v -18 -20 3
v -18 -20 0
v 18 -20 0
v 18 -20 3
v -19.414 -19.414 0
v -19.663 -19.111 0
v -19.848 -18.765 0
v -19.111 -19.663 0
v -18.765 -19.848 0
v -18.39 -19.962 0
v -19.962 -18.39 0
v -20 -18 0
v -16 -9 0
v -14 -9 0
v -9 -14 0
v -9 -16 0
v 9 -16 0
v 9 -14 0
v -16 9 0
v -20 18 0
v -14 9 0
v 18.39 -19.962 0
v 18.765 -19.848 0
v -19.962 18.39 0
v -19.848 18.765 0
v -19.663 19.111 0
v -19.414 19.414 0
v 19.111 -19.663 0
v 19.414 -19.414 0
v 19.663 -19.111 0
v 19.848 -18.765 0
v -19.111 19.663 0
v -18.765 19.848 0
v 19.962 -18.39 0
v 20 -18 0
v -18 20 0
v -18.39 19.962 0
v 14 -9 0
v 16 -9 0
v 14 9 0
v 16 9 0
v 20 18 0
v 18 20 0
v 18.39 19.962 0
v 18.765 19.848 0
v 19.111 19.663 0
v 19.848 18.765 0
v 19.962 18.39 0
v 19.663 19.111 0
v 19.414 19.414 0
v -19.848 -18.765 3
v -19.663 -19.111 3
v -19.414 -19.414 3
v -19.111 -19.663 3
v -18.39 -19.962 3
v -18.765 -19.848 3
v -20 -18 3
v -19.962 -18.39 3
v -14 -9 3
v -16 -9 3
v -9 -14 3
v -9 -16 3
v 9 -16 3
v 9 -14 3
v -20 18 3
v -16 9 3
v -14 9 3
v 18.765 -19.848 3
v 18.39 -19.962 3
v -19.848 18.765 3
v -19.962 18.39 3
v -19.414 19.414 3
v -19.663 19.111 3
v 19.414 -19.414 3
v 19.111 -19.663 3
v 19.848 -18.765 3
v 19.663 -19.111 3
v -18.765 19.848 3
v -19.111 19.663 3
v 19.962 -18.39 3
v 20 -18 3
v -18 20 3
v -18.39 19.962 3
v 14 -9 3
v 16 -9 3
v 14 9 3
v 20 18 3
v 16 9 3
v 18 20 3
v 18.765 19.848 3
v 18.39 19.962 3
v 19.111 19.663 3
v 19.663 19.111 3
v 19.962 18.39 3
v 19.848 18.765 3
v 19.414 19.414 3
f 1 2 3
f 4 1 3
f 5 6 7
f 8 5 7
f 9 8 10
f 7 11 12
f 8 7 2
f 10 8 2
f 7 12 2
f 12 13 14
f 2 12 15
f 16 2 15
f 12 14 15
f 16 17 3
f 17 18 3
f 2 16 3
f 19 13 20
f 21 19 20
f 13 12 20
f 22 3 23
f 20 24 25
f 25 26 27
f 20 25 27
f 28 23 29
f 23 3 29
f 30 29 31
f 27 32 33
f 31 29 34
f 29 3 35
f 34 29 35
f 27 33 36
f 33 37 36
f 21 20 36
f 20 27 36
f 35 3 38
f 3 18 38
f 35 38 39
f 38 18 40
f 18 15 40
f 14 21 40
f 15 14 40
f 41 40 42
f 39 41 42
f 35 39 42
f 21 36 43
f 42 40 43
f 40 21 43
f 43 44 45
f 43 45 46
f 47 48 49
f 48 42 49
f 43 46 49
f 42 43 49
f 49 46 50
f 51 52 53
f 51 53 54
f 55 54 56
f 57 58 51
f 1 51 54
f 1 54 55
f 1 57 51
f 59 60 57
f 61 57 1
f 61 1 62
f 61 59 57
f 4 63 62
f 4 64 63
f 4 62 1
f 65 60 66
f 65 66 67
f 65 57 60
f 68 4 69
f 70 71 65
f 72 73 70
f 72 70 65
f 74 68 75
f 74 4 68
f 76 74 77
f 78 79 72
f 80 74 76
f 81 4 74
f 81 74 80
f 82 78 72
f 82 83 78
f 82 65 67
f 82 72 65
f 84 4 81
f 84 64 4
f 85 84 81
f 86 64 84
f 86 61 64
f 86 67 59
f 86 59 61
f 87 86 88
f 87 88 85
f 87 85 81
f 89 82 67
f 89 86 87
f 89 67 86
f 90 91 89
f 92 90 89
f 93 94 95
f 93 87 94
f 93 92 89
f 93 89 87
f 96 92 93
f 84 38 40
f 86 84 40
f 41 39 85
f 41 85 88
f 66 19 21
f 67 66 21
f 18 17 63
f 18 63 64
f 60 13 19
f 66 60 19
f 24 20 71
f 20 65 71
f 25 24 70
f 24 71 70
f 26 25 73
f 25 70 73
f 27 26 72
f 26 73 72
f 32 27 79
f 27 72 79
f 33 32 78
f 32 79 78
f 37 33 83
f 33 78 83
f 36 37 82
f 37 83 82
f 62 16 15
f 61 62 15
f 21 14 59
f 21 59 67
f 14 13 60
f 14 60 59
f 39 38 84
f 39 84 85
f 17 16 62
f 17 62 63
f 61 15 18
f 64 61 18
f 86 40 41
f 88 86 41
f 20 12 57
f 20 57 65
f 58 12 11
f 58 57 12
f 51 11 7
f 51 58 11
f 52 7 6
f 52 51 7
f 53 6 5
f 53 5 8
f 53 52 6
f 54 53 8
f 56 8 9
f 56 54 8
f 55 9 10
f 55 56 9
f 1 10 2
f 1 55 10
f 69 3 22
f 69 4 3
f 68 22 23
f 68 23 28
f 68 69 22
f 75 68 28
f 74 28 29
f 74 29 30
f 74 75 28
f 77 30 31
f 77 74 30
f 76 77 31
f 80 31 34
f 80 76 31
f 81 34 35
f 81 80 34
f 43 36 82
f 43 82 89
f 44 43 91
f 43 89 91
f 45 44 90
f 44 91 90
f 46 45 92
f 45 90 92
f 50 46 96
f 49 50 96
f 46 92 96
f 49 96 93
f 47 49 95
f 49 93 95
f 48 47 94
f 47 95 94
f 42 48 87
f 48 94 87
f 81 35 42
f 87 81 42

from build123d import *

# Parameters (mm, degrees)
F0_W     = 40
F0_H     = 40
F0_W_2   = 18
F0_H_2   = 2
F0_W_3   = 2
F0_H_3   = 18
F1_DEPTH = 3
F2_R     = 2


with BuildPart() as f1:
    # F0 (on Top) → F1 (new body)
    with BuildSketch(Plane.XY):
        Rectangle(F0_W, F0_H)
        with Locations((0, -15)):
            Rectangle(F0_W_2, F0_H_2, mode=Mode.SUBTRACT)
        with Locations((-15, 0)):
            Rectangle(F0_W_3, F0_H_3, mode=Mode.SUBTRACT)
        with Locations((15, 0)):
            Rectangle(F0_W_3, F0_H_3, mode=Mode.SUBTRACT)
    extrude(amount=F1_DEPTH)

    # F2
    f2_edges = [f1.edges().sort_by_distance(p)[0] for p in [
        (20, -20, 1.5),
        (-20, -20, 1.5),
        (-20, 20, 1.5),
        (20, 20, 1.5),
    ]]
    fillet(f2_edges, radius=F2_R)


solid = f1.part
